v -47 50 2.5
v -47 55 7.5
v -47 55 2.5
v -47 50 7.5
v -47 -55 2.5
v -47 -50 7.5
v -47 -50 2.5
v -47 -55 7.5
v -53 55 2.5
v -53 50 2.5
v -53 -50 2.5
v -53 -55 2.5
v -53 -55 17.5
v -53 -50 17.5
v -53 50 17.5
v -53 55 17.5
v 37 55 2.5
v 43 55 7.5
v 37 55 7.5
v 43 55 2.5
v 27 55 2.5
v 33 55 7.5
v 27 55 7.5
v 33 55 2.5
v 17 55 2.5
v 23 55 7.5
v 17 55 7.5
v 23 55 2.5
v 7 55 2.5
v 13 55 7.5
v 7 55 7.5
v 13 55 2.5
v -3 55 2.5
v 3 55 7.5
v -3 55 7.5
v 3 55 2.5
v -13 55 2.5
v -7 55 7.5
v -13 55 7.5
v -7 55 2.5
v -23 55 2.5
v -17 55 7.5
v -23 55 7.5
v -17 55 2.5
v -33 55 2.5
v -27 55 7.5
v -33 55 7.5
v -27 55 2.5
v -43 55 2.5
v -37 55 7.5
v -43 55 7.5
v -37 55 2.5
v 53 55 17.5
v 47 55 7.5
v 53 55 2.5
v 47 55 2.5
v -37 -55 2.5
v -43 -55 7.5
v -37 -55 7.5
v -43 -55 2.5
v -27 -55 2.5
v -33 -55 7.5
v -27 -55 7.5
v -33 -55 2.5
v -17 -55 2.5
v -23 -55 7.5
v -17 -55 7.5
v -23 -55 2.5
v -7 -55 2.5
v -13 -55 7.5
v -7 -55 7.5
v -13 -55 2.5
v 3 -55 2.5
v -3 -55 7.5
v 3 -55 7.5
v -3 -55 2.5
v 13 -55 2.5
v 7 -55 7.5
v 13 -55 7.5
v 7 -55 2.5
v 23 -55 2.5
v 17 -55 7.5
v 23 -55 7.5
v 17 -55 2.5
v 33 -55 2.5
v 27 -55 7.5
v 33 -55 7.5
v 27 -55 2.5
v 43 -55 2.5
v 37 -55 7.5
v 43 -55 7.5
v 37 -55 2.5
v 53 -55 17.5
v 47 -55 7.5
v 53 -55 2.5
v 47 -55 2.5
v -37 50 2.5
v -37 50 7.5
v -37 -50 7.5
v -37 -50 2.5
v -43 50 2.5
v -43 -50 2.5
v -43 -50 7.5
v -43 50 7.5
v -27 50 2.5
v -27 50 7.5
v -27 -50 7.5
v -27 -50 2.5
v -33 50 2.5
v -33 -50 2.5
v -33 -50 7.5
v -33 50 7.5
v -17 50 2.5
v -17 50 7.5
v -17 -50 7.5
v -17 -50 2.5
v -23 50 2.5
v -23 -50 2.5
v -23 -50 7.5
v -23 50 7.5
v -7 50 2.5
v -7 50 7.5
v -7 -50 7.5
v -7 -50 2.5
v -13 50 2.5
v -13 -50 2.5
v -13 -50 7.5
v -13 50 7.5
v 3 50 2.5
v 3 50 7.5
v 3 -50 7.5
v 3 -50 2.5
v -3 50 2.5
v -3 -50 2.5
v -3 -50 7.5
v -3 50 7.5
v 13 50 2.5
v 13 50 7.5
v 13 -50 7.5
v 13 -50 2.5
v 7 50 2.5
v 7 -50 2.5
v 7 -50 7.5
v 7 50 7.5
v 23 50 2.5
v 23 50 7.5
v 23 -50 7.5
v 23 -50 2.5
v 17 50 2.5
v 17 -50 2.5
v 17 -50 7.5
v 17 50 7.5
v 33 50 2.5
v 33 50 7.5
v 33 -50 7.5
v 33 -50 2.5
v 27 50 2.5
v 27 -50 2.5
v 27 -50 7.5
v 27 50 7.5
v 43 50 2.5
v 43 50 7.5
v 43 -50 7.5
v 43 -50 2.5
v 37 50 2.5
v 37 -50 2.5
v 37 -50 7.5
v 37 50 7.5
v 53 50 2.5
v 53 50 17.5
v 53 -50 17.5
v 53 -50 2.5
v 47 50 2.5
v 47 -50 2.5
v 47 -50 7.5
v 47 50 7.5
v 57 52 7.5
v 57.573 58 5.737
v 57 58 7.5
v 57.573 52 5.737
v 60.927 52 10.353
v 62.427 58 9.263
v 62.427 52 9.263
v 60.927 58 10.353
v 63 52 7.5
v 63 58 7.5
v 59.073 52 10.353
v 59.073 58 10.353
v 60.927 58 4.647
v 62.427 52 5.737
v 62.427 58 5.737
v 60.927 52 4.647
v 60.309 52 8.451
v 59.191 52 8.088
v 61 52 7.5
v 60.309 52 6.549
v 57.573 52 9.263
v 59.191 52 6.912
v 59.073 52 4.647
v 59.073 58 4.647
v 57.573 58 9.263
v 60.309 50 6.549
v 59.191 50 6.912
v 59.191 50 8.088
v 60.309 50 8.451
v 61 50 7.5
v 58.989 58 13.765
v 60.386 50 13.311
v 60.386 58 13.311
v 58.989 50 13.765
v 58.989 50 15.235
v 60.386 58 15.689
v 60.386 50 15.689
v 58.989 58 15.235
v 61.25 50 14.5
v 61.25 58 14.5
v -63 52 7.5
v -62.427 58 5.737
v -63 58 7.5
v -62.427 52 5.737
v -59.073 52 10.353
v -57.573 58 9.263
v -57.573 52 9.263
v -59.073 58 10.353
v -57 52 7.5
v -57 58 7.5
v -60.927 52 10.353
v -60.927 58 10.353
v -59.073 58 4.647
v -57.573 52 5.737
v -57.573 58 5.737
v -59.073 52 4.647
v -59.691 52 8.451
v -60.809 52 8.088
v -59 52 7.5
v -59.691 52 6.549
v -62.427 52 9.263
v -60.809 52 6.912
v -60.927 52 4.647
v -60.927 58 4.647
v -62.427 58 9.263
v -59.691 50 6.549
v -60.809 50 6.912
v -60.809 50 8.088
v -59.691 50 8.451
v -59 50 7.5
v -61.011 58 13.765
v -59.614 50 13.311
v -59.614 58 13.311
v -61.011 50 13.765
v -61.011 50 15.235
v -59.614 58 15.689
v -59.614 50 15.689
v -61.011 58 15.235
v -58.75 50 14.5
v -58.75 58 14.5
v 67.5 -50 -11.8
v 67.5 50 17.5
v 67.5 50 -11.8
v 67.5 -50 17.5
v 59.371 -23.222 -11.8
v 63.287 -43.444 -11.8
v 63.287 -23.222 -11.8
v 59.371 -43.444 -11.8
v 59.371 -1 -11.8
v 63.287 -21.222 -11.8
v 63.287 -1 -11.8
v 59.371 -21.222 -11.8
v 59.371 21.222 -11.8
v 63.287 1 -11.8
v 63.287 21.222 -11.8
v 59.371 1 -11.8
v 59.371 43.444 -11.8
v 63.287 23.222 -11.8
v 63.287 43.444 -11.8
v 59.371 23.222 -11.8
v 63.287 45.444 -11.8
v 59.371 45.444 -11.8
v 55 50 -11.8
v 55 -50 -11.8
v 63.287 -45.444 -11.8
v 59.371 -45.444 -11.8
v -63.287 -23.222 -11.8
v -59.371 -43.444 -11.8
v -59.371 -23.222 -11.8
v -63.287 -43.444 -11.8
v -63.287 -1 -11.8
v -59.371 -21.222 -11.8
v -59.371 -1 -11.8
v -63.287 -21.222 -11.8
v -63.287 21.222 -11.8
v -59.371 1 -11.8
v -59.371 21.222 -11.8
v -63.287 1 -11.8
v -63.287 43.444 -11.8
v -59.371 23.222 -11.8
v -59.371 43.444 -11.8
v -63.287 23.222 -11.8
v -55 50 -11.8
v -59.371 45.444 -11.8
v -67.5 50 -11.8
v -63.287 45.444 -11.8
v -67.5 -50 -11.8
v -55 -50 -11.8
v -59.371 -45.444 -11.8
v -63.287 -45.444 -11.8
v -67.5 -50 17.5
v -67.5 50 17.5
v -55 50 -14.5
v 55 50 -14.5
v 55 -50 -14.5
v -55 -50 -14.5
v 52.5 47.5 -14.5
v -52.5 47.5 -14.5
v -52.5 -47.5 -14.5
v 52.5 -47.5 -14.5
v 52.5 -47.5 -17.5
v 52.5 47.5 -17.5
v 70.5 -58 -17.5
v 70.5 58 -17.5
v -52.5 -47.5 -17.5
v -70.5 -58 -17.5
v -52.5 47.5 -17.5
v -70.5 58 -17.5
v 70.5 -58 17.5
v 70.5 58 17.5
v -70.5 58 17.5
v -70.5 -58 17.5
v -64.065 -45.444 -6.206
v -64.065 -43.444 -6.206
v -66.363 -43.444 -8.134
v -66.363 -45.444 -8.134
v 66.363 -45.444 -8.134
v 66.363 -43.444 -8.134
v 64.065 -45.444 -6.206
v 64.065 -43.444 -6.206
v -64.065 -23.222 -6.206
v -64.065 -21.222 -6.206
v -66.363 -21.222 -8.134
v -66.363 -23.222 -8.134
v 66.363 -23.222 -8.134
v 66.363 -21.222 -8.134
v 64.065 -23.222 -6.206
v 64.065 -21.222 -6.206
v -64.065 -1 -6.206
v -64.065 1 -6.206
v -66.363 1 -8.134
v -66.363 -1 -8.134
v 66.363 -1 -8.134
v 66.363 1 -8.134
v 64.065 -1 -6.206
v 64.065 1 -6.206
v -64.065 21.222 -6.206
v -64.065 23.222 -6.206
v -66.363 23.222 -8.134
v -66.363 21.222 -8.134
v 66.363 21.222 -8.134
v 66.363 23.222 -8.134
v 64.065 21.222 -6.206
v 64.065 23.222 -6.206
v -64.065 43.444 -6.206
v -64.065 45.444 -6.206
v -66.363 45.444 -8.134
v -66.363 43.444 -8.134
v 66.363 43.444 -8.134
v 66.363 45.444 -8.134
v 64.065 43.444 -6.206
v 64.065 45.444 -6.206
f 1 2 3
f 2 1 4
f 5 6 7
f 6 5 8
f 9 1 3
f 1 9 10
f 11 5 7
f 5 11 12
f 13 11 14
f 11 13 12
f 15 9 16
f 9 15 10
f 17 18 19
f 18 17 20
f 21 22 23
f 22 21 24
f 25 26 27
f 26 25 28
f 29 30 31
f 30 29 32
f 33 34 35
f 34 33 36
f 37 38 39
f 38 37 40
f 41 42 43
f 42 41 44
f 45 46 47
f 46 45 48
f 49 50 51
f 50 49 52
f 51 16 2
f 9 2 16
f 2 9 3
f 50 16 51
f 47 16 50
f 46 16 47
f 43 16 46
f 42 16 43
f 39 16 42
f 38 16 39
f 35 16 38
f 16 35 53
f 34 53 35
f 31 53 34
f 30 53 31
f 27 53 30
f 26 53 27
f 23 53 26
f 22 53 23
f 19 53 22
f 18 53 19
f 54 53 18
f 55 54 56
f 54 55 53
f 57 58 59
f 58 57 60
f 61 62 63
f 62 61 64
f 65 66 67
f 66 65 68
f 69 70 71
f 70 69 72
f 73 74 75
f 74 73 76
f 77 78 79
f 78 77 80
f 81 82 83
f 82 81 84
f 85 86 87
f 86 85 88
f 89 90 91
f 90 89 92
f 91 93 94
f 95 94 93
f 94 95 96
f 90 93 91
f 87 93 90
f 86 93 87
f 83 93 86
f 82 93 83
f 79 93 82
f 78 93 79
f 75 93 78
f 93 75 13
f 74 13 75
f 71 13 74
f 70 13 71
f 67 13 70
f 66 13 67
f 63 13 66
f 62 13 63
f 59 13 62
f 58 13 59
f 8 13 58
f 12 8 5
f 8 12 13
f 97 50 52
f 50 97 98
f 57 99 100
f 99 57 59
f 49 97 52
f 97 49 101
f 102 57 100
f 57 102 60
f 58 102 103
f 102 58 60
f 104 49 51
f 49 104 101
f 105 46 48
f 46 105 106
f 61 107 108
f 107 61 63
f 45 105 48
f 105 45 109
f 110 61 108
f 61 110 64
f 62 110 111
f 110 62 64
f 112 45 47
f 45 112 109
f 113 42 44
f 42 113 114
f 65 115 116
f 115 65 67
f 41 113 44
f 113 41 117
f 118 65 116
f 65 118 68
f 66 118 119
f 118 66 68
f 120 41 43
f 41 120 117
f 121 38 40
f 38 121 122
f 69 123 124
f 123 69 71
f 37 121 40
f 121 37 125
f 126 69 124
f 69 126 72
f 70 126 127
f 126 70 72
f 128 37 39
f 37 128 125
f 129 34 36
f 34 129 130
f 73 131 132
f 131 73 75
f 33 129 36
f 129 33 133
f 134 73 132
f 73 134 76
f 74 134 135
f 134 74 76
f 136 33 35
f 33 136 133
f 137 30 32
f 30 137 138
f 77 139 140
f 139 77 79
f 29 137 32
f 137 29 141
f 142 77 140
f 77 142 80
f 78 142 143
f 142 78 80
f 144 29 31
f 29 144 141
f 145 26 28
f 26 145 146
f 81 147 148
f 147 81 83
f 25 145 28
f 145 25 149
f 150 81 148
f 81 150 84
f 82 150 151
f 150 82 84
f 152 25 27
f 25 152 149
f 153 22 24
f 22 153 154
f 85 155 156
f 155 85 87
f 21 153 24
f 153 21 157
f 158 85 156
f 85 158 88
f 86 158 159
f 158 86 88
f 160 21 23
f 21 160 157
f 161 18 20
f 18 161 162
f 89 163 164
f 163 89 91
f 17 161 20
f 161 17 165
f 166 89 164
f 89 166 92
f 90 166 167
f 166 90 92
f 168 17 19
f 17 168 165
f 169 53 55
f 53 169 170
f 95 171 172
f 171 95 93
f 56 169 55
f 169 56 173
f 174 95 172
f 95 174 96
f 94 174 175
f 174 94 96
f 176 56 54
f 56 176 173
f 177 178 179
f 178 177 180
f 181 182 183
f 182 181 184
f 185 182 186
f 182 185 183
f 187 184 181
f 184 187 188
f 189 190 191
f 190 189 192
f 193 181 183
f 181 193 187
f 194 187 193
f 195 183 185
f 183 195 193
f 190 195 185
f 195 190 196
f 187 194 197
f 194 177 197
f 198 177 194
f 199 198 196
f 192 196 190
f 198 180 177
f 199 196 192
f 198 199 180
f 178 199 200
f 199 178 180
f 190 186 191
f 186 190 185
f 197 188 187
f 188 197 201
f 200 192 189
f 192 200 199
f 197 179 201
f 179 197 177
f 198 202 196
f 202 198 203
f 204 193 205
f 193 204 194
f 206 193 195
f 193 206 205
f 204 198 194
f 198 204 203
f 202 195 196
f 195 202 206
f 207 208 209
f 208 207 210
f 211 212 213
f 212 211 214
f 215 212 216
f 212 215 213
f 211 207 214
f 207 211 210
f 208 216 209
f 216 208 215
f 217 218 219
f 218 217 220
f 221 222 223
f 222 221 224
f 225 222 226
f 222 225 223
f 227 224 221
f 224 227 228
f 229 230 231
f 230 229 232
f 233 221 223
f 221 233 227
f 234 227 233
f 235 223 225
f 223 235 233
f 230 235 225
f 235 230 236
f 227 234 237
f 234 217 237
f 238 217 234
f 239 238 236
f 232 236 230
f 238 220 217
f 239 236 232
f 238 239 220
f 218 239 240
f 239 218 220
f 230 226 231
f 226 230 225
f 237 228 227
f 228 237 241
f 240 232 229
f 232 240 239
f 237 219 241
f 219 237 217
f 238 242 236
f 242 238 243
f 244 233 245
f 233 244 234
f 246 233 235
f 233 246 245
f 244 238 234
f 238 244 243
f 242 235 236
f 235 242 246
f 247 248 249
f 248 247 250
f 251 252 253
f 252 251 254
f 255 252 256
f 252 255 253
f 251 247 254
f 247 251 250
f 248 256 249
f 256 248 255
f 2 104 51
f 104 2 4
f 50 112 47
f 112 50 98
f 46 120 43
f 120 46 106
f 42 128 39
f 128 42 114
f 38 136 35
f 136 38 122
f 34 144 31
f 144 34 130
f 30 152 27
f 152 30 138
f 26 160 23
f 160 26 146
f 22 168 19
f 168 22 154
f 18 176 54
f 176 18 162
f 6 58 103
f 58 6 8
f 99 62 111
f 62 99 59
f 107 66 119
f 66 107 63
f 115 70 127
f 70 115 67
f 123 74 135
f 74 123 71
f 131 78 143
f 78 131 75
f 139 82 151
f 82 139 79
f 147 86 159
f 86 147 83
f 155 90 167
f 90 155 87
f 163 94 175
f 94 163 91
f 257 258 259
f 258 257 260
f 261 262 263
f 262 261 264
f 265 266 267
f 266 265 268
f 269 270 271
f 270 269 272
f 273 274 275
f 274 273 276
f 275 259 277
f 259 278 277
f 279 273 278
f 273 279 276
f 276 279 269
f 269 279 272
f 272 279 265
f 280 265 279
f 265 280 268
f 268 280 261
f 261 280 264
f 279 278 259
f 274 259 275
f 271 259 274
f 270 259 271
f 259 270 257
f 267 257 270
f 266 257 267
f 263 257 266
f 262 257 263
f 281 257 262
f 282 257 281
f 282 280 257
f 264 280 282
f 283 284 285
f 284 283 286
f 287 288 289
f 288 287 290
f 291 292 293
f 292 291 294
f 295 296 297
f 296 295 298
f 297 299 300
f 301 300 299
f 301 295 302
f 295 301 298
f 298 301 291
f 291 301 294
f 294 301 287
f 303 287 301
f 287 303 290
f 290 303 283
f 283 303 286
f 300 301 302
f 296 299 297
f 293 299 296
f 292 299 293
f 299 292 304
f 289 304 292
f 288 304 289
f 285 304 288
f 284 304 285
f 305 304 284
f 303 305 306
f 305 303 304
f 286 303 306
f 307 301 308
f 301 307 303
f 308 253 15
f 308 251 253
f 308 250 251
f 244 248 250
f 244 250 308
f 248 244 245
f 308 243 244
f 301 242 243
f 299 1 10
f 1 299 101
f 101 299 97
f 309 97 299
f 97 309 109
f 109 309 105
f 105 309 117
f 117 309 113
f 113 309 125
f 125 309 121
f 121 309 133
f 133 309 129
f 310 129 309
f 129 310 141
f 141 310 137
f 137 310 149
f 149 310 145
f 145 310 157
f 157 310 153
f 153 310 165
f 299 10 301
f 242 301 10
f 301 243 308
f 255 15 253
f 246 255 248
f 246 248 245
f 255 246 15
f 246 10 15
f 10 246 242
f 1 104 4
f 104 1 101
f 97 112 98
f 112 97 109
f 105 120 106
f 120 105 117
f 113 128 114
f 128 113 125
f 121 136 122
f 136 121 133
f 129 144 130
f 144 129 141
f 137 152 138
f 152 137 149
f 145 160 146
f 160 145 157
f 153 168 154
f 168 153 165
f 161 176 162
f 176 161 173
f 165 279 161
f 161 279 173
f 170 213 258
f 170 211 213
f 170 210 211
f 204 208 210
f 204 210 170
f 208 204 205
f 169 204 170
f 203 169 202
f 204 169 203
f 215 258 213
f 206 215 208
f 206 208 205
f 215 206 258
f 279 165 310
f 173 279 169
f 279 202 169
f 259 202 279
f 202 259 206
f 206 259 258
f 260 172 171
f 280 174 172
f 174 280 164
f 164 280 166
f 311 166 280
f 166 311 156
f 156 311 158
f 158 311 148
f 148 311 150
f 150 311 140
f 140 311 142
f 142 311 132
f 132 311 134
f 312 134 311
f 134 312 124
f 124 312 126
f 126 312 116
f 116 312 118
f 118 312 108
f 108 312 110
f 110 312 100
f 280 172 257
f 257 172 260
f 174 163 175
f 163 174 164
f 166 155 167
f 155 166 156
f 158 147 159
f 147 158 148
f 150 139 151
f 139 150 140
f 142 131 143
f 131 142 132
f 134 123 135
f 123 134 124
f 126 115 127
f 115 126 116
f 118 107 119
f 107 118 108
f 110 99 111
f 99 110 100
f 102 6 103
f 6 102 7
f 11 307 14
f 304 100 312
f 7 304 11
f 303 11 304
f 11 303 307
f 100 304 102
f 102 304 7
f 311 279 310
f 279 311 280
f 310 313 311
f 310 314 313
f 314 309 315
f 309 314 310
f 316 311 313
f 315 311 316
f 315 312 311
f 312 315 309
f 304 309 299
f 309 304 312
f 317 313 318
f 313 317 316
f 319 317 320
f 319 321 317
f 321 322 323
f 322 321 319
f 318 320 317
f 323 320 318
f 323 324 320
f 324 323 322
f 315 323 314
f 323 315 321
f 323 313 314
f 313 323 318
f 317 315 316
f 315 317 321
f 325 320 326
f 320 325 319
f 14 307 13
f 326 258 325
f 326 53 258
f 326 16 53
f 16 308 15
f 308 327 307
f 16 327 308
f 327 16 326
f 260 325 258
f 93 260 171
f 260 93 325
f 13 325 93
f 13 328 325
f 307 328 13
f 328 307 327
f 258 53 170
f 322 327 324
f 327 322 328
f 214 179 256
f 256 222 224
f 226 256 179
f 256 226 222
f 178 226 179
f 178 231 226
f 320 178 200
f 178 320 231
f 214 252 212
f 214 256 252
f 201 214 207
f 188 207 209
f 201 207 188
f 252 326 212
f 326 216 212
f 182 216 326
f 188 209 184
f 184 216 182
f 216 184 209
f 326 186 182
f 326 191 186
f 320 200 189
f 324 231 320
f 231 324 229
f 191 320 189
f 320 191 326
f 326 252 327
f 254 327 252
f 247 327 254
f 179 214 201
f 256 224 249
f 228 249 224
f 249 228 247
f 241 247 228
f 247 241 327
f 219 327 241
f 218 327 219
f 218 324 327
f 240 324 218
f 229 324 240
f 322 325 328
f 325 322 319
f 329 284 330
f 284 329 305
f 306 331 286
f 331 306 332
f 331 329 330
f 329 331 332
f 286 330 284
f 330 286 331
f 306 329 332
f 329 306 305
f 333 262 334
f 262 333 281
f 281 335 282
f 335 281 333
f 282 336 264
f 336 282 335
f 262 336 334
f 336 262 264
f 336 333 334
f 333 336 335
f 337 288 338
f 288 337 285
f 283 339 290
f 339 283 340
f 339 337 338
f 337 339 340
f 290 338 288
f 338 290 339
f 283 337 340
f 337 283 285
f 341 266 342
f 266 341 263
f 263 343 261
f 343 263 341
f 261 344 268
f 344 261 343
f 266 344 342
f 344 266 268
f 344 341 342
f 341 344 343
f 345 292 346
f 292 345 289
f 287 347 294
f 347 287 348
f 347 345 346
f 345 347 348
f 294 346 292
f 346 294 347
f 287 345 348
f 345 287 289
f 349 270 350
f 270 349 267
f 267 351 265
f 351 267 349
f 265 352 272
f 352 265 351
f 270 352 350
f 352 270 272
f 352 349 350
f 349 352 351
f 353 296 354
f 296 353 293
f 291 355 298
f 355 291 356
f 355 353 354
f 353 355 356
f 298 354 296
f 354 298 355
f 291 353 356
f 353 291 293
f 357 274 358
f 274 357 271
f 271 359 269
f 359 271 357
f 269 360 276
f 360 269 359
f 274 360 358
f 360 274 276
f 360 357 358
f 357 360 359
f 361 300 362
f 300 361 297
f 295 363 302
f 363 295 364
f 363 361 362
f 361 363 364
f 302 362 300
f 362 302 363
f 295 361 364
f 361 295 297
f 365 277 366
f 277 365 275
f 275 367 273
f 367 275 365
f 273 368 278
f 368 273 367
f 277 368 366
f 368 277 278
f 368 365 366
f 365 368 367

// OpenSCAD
height = 35;
glass_x = 110;
glass_y = 100;
glass_h = 2.7;
wall = 3;

istep = 10;
comb_width = 6;
comb_places = glass_x/istep-1;

banana_d = 6;

hole_d = 2.5;

module banana_hole() {
  translate([0, glass_y/2, height/2-10]) {
    rotate([90, 0, 0]) {
      translate([0, 0, -27]) {
        cylinder(d=banana_d, h=50, center=true);
      }
      cylinder(d=2, h=50, center=true);
      translate([0, 7, 0]) {
        cylinder(d=hole_d, h=50, center=true);
      }
    }
  }
}

module wire_holder() {
    rotate([0, 50, 0]) {
      cube([10, 2, 3], center=true);
    }
}

module chamber() {
  difference() {
//  union() {
    // walls
    cube([glass_x+25+2*wall, glass_y+10+2*wall, height], center=true);
    translate([0, 0, 0]) {
      // attach zone
      translate([0, 0, height-10]) {
        cube([glass_x-10, glass_y+10, height], center=true);
      }
      // comb zone
      for(i=[-comb_places/2:comb_places/2]) {
        translate([i*istep, 0, height-15]) {
          cube([comb_width, glass_y+10, height], center=true);
        }
      }
      // water zone
      translate([0, 0, 3+glass_h]) {
        cube([glass_x+25, glass_y, height], center=true);
      }
      // extraction bigger
      translate([0, 0, 3]) {
        cube([glass_x, glass_y, height], center=true);
      }
      translate([0, 0, 0]) {
        // extraction smaller
        cube([glass_x-5, glass_y-5, height], center=true);
      }
      translate([glass_x/2+5, 0, 0]) {
        banana_hole();
      }
      translate([-glass_x/2-5, 0, 0]) {
        banana_hole();
      }      
    }
  }
  for(i=[-2:2]) {
    translate([-glass_x/2-7, i*(glass_y/4.5), -11]) {
      wire_holder();
    }
    translate([glass_x/2+7, i*(glass_y/4.5), -11]) {
      rotate([180, 0, 0]) {
        wire_holder();
      }
    }
  }
}

chamber();
